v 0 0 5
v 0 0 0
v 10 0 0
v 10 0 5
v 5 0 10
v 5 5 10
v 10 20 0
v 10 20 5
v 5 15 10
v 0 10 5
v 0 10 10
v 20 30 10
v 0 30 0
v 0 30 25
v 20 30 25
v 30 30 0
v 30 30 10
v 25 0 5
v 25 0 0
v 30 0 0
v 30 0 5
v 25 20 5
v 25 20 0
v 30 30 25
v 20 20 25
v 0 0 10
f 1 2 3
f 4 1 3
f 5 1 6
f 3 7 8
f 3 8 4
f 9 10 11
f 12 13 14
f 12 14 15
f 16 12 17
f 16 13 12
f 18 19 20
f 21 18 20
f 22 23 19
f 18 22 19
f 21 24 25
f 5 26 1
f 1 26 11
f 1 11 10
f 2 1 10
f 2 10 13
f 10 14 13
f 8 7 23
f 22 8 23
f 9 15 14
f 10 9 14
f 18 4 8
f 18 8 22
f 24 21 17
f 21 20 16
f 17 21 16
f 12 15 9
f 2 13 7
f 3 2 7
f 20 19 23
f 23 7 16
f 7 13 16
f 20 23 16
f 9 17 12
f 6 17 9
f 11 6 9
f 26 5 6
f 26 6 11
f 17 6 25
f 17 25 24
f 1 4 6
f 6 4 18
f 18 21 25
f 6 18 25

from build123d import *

# Parameters (mm, degrees)
F0_W      = 30
F0_H      = 30
F1_DEPTH  = 25
F6_W      = 15
F6_H      = 20
F10_DEPTH = 5
F11_DEPTH = 30.0010001
F12_DEPTH = 15


with BuildPart() as f1:
    # F0 (on Top) → F1 (new body)
    with BuildSketch(Plane.XY):
        with Locations((15, 15)):
            Rectangle(F0_W, F0_H)
    extrude(amount=F1_DEPTH)

    # F2 (on face) → F7 section 0
    with BuildSketch(Plane.XY.offset(25), mode=Mode.PRIVATE) as f7_s0:
        Polygon((0, 10), (20, 30), (0, 30), align=None)
    loft([f7_s0.sketch, Vertex(0, 10, 5)], mode=Mode.SUBTRACT)

    # F2 (on face) → F8 section 0
    with BuildSketch(Plane.XY.offset(25), mode=Mode.PRIVATE) as f8_s0:
        Polygon((30, 0), (30, 30), (20, 20), align=None)
    loft([f8_s0.sketch, Vertex(30, 0, 5)], mode=Mode.SUBTRACT)

    # F3 (on face) → F9 section 0
    with BuildSketch(Plane.XZ, mode=Mode.PRIVATE) as f9_s0:
        Polygon((30, 25), (20, 25), (30, 5), align=None)
    loft([f9_s0.sketch, Vertex(20, 20, 25)], mode=Mode.SUBTRACT)

    # F6 (on face) → F10 (cut)
    with BuildSketch(Plane(origin=(0, 0, 0), x_dir=(1, 0, 0), z_dir=(0, 0, -1))):
        with Locations((17.5, -10)):
            Rectangle(F6_W, F6_H)
    extrude(amount=-F10_DEPTH, mode=Mode.SUBTRACT)

    # F4 (on face) → F11 (cut, through all)
    with BuildSketch(Plane.YZ.offset(30)):
        Polygon((0, 25), (0, 5), (20, 25), align=None)
    extrude(amount=-F11_DEPTH, mode=Mode.SUBTRACT)

    # F2 (on face) → F12 (cut)
    with BuildSketch(Plane.XY.offset(25)):
        Polygon((30, 30), (20, 30), (0, 10), (0, 0), (20, 20), align=None)
    extrude(amount=-F12_DEPTH, mode=Mode.SUBTRACT)

    # F13 (on face) → F14 (join, up to the next surface of F1)
    with BuildSketch(Plane.XZ):
        Polygon((0, 5), (5, 10), (0, 10), align=None)
    extrude(until=Until.NEXT, dir=(0, 1, 0))


solid = f1.part
